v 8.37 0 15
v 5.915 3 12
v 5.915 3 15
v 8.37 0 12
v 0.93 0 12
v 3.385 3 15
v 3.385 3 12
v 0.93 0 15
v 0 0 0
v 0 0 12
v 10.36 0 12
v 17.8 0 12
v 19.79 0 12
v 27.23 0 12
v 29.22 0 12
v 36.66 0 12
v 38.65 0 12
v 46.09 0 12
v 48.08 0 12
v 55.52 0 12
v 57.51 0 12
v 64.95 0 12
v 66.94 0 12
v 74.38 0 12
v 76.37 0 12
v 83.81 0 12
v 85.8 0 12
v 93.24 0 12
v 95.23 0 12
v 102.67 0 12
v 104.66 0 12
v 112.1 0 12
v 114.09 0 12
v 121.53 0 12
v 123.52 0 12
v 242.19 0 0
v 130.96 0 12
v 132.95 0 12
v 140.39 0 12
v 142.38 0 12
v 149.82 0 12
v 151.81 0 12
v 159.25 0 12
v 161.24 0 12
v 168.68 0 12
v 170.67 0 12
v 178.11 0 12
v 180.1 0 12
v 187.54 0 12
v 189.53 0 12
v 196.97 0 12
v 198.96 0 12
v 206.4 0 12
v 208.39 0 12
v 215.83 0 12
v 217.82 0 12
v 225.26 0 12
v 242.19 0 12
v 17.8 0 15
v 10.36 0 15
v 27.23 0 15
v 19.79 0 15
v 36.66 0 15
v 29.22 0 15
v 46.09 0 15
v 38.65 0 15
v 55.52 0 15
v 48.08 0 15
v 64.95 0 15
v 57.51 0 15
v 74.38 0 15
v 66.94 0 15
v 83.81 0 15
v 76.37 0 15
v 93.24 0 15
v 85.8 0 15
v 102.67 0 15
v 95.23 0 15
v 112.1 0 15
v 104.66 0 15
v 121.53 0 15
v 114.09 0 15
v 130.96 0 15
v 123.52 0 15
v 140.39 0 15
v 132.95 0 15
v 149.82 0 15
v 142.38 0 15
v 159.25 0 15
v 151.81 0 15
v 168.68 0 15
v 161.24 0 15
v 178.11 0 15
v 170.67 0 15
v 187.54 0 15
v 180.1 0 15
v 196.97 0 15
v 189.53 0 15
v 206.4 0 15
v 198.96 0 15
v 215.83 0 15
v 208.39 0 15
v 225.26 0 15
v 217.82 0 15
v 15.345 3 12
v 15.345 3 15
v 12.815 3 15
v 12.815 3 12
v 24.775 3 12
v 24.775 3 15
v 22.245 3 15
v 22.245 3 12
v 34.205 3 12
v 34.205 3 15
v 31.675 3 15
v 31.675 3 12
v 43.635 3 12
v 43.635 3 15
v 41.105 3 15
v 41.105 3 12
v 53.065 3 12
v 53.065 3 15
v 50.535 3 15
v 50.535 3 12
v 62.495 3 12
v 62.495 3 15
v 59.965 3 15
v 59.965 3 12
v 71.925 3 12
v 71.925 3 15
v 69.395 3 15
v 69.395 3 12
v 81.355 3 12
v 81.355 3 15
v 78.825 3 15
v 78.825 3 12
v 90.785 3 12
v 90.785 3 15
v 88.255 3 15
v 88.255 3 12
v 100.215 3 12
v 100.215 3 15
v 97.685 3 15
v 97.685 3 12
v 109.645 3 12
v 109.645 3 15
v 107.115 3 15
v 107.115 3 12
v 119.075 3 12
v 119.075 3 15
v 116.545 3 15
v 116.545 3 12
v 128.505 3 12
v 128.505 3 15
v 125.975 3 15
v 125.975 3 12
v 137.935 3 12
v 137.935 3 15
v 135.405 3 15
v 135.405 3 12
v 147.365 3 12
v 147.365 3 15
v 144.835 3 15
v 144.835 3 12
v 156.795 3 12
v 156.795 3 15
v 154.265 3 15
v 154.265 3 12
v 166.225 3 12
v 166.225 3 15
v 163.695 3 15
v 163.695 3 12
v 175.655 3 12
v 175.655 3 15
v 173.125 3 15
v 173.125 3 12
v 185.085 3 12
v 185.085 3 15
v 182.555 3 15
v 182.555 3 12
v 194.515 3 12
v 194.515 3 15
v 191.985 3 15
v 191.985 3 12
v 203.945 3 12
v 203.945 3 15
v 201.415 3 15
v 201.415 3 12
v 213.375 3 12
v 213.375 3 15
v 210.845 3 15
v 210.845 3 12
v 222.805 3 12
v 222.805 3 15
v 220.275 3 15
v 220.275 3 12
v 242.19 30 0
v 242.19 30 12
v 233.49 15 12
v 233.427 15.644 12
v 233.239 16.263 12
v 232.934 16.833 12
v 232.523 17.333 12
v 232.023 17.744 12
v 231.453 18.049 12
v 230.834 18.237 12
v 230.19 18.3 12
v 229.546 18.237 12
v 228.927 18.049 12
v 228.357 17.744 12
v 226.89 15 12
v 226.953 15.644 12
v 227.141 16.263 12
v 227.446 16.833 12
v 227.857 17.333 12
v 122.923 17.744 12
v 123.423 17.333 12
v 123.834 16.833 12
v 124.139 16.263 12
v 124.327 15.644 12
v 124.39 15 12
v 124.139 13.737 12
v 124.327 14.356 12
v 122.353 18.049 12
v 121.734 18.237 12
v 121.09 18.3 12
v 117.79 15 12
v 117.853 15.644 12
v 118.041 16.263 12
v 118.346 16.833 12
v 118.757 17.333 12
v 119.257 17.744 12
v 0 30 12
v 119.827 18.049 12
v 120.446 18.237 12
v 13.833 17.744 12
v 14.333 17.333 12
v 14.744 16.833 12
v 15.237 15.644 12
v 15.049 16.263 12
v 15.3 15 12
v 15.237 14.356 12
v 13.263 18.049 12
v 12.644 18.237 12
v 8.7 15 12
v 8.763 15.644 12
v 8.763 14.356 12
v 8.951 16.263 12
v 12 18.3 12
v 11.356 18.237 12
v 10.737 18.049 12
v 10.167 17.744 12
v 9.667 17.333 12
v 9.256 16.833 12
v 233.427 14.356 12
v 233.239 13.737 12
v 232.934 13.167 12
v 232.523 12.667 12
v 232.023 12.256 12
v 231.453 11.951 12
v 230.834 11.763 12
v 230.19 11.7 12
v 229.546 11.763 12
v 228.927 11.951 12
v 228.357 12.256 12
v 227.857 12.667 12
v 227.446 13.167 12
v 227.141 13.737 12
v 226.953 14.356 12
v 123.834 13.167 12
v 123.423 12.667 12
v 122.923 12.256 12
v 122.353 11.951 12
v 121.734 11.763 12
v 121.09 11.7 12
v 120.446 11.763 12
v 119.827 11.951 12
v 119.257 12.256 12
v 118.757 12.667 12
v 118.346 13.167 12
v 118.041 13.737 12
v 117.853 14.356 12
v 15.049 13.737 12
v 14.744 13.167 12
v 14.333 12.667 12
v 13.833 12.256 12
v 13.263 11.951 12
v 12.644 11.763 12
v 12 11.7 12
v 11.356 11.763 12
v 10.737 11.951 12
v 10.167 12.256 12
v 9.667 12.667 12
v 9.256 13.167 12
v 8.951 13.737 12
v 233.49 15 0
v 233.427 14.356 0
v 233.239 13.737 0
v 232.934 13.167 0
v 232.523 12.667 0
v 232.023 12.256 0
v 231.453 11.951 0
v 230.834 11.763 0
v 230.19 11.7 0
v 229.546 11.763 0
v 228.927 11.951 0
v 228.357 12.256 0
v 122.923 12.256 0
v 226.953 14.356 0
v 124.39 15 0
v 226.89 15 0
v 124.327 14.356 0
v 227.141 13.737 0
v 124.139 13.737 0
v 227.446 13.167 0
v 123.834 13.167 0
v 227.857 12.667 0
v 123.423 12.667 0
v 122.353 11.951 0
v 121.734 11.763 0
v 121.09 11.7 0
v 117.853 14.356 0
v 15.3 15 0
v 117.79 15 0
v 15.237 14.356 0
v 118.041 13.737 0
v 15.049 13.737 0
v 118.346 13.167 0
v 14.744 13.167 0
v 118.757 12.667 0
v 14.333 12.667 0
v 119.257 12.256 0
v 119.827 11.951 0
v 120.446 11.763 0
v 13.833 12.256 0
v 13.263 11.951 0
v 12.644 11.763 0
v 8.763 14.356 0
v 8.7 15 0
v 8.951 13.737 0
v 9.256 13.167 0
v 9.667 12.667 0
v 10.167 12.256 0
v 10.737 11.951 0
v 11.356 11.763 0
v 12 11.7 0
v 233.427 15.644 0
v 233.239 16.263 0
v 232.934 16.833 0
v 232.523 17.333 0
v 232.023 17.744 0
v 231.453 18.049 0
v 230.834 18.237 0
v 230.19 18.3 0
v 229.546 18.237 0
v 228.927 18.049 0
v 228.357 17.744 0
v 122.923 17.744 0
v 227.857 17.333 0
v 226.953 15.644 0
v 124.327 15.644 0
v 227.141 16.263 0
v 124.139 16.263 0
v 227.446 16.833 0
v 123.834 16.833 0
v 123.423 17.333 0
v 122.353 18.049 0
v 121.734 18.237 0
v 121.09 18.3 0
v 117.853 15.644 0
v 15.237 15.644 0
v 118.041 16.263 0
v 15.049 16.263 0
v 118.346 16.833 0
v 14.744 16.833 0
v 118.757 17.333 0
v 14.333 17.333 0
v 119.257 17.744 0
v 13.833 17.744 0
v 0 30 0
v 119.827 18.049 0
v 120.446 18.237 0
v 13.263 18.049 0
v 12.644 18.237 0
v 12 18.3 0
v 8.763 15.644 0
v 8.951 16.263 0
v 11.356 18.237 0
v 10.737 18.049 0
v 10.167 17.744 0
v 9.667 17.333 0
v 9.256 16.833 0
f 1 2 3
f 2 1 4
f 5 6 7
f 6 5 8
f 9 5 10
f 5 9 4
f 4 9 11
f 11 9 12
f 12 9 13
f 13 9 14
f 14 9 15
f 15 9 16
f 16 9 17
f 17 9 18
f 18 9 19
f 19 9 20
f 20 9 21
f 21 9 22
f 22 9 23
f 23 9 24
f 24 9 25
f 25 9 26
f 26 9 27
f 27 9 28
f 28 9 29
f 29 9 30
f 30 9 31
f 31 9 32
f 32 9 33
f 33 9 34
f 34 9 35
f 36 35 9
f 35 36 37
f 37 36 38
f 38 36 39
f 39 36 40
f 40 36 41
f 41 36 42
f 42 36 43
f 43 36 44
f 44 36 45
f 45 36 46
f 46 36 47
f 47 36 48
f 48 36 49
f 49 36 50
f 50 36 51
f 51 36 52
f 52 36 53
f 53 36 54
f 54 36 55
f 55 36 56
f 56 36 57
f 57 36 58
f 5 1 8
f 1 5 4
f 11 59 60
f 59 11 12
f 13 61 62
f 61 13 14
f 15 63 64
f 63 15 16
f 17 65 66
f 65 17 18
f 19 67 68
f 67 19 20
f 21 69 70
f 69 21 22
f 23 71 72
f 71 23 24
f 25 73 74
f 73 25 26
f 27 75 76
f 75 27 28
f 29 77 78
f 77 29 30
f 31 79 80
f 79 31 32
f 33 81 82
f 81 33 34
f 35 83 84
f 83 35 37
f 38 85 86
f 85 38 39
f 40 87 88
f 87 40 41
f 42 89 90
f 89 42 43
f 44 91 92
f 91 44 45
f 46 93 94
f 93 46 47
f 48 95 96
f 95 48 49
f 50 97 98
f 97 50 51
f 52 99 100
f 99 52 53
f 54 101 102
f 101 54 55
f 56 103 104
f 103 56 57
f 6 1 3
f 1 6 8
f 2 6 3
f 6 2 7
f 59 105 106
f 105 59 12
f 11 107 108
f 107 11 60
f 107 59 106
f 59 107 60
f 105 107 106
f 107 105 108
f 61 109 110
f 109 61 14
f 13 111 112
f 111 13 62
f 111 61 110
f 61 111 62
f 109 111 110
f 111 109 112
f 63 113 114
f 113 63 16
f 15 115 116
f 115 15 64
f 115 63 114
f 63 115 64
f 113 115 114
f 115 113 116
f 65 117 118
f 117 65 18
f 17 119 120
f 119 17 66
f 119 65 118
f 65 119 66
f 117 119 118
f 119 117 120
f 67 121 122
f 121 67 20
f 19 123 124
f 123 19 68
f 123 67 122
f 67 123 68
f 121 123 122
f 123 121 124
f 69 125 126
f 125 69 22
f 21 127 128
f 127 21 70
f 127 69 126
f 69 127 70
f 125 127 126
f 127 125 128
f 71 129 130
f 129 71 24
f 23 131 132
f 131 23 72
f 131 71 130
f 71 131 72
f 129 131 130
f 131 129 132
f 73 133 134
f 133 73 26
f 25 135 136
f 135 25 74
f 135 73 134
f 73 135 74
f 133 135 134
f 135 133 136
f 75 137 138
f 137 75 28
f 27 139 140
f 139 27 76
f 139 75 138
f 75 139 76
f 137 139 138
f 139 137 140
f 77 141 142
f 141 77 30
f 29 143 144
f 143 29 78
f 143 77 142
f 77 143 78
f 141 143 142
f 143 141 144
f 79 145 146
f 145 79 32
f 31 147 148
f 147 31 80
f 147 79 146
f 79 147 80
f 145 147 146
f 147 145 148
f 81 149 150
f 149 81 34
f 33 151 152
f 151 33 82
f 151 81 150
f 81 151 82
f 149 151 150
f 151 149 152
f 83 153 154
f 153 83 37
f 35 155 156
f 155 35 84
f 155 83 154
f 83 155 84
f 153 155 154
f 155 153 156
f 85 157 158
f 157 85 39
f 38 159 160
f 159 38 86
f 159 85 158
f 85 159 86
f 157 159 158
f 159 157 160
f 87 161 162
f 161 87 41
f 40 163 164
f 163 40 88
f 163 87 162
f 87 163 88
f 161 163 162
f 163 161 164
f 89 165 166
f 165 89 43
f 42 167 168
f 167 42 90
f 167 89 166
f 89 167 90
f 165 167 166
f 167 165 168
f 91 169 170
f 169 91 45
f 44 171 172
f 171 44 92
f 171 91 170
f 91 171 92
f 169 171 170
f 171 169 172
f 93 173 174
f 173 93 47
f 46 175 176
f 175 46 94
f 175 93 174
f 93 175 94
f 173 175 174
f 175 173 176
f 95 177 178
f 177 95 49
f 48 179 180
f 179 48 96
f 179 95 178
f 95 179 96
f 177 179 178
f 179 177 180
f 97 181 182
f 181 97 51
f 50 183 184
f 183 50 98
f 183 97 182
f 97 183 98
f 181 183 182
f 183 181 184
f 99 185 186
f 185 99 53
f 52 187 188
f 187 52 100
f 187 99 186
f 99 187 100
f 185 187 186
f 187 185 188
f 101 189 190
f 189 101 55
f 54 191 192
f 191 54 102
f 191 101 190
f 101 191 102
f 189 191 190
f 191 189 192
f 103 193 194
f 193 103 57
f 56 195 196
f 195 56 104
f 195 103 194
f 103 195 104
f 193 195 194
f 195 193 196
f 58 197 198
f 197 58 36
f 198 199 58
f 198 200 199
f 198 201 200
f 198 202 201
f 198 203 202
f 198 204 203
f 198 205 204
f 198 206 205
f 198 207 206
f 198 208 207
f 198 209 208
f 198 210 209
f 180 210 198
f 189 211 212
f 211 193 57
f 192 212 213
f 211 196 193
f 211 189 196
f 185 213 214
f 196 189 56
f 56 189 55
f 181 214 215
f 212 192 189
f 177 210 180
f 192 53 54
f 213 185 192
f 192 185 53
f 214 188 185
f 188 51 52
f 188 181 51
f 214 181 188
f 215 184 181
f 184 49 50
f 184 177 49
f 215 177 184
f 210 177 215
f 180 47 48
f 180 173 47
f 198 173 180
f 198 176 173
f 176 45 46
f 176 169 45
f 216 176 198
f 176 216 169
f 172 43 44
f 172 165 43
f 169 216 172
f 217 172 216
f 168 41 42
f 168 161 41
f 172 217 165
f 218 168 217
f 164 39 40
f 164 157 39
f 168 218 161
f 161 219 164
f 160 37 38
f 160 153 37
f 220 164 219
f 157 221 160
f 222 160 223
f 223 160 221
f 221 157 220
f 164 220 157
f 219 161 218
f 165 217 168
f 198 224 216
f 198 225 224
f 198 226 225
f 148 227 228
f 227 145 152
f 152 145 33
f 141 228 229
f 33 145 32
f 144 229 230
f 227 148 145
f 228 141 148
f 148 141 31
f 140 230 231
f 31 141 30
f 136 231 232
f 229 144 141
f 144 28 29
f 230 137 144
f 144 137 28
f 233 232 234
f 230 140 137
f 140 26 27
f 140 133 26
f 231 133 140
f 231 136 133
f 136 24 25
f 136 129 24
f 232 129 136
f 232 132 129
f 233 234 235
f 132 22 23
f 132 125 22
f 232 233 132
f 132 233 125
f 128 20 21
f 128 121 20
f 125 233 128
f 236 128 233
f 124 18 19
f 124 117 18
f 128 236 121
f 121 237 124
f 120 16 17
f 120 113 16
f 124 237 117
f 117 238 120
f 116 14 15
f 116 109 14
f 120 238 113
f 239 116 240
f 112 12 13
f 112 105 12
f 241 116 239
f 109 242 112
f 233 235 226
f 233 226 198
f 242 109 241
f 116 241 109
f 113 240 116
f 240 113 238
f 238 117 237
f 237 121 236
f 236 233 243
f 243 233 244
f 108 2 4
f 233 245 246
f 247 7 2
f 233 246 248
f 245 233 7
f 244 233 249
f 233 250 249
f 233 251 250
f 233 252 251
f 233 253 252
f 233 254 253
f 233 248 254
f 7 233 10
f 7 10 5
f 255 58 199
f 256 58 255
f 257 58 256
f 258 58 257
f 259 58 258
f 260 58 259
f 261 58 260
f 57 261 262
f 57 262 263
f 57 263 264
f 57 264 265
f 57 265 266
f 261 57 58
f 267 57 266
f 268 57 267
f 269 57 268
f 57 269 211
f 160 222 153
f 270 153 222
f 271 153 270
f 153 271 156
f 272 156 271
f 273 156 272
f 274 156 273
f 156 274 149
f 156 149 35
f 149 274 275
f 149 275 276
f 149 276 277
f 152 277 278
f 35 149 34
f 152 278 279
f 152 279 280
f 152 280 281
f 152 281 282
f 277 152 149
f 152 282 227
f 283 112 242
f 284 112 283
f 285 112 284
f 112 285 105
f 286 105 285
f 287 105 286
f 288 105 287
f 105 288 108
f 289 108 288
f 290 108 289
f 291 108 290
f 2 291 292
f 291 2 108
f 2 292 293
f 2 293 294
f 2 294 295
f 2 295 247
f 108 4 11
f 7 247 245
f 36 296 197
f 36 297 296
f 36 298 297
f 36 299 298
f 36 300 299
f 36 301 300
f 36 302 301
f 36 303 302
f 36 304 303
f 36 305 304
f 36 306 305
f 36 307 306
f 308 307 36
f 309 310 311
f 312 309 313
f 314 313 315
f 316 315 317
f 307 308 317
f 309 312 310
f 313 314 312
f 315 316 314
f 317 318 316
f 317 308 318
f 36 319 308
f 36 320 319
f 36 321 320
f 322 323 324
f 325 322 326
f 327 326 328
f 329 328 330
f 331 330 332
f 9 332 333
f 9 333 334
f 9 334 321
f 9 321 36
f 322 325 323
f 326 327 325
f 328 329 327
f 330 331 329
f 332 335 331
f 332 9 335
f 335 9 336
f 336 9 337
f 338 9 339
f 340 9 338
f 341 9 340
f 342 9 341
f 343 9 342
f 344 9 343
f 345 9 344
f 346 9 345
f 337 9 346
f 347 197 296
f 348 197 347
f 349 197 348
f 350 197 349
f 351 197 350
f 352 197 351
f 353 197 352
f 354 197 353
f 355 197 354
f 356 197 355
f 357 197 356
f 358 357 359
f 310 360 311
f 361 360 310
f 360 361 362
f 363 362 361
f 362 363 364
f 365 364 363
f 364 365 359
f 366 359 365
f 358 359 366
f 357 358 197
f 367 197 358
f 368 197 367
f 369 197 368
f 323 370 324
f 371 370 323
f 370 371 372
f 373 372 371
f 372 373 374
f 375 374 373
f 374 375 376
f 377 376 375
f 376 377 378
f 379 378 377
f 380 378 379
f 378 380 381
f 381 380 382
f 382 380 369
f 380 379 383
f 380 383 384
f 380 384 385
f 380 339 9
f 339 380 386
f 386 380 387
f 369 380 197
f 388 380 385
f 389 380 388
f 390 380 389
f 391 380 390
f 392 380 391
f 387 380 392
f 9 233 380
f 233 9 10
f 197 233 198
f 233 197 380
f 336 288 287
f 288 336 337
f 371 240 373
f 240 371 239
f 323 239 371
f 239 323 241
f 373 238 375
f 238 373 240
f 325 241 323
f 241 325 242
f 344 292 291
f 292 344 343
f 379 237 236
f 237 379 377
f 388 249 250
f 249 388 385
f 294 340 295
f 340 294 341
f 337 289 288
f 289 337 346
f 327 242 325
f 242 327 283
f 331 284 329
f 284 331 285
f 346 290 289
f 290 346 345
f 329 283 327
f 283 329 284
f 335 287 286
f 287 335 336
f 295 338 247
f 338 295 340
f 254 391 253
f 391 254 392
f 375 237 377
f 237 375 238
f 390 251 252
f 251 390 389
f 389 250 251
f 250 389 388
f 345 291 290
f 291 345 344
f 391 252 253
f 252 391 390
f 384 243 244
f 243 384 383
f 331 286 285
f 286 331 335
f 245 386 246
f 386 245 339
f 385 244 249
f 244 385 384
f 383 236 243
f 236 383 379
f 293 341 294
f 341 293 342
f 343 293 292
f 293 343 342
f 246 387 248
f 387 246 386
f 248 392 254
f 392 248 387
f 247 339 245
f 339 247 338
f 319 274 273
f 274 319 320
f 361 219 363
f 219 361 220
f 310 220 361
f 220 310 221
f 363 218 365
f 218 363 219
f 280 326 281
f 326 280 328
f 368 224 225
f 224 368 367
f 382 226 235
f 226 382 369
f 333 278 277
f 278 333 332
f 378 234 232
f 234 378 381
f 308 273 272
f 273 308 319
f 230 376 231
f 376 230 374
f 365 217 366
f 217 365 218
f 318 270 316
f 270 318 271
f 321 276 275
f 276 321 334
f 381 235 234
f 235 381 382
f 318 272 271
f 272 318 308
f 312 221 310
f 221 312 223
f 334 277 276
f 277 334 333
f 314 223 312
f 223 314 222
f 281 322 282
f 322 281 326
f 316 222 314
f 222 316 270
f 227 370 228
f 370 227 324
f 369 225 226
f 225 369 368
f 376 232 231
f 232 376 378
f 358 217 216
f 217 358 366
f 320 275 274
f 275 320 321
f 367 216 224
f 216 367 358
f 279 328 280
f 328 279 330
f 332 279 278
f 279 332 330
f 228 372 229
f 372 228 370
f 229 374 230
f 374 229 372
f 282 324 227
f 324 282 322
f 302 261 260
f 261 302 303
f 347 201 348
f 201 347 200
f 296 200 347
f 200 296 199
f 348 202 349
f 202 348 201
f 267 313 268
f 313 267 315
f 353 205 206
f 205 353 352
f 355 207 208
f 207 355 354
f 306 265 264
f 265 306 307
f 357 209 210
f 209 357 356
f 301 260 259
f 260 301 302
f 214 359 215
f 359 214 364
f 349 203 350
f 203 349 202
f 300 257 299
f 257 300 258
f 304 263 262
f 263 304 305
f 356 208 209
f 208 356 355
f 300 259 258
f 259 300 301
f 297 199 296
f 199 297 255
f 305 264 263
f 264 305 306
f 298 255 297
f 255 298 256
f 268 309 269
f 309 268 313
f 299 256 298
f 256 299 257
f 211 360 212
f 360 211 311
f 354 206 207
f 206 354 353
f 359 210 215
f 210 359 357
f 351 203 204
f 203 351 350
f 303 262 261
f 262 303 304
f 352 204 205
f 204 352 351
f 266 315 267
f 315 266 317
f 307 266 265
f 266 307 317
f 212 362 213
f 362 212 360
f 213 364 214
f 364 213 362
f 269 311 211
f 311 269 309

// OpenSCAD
$fn = 32;

// ----------------------------------------------------------------------
// Gear rack: m=3 z=24, 242.19 x 30 x 15 mm
// ----------------------------------------------------------------------

// --- parameters (mm) ---
rack_len = 242.19;        // rack length, X
rack_w = 30;              // rack width, Y
rack_h = 15;              // overall height, Z
modul = 3;                // module
body_t = 12;              // tooth root line height
pitch = 9.43;             // circular pitch
tip_w = 2.53;             // tooth thickness at the tip
root_w = 7.44;            // tooth thickness at the root line
hole_d = 6.6;             // mounting hole
sink = 0.6;               // tooth root overlap into the body

tooth_span = 226.19;

module tooth(x0) {
  /* 20 deg flank profile, sunk into the body for a positive overlap */
  translate([x0, 0, body_t - sink])
    linear_extrude(height = rack_h - body_t + sink)
      polygon(points = [[-root_w / 2, 0], [root_w / 2, 0],
                        [tip_w / 2, rack_h - body_t],
                        [-tip_w / 2, rack_h - body_t]]);
}

difference() {
  union() {
    cube([rack_len, rack_w, body_t]);
    for (i = [0 : 24 - 1])
      tooth((i + 0.5) * pitch + (tooth_span - 24 * pitch) / 2);
  }
  translate([12, 15, -1]) cylinder(h = body_t + 2, d = hole_d);
  translate([121.09, 15, -1]) cylinder(h = body_t + 2, d = hole_d);
  translate([230.19, 15, -1]) cylinder(h = body_t + 2, d = hole_d);
}
